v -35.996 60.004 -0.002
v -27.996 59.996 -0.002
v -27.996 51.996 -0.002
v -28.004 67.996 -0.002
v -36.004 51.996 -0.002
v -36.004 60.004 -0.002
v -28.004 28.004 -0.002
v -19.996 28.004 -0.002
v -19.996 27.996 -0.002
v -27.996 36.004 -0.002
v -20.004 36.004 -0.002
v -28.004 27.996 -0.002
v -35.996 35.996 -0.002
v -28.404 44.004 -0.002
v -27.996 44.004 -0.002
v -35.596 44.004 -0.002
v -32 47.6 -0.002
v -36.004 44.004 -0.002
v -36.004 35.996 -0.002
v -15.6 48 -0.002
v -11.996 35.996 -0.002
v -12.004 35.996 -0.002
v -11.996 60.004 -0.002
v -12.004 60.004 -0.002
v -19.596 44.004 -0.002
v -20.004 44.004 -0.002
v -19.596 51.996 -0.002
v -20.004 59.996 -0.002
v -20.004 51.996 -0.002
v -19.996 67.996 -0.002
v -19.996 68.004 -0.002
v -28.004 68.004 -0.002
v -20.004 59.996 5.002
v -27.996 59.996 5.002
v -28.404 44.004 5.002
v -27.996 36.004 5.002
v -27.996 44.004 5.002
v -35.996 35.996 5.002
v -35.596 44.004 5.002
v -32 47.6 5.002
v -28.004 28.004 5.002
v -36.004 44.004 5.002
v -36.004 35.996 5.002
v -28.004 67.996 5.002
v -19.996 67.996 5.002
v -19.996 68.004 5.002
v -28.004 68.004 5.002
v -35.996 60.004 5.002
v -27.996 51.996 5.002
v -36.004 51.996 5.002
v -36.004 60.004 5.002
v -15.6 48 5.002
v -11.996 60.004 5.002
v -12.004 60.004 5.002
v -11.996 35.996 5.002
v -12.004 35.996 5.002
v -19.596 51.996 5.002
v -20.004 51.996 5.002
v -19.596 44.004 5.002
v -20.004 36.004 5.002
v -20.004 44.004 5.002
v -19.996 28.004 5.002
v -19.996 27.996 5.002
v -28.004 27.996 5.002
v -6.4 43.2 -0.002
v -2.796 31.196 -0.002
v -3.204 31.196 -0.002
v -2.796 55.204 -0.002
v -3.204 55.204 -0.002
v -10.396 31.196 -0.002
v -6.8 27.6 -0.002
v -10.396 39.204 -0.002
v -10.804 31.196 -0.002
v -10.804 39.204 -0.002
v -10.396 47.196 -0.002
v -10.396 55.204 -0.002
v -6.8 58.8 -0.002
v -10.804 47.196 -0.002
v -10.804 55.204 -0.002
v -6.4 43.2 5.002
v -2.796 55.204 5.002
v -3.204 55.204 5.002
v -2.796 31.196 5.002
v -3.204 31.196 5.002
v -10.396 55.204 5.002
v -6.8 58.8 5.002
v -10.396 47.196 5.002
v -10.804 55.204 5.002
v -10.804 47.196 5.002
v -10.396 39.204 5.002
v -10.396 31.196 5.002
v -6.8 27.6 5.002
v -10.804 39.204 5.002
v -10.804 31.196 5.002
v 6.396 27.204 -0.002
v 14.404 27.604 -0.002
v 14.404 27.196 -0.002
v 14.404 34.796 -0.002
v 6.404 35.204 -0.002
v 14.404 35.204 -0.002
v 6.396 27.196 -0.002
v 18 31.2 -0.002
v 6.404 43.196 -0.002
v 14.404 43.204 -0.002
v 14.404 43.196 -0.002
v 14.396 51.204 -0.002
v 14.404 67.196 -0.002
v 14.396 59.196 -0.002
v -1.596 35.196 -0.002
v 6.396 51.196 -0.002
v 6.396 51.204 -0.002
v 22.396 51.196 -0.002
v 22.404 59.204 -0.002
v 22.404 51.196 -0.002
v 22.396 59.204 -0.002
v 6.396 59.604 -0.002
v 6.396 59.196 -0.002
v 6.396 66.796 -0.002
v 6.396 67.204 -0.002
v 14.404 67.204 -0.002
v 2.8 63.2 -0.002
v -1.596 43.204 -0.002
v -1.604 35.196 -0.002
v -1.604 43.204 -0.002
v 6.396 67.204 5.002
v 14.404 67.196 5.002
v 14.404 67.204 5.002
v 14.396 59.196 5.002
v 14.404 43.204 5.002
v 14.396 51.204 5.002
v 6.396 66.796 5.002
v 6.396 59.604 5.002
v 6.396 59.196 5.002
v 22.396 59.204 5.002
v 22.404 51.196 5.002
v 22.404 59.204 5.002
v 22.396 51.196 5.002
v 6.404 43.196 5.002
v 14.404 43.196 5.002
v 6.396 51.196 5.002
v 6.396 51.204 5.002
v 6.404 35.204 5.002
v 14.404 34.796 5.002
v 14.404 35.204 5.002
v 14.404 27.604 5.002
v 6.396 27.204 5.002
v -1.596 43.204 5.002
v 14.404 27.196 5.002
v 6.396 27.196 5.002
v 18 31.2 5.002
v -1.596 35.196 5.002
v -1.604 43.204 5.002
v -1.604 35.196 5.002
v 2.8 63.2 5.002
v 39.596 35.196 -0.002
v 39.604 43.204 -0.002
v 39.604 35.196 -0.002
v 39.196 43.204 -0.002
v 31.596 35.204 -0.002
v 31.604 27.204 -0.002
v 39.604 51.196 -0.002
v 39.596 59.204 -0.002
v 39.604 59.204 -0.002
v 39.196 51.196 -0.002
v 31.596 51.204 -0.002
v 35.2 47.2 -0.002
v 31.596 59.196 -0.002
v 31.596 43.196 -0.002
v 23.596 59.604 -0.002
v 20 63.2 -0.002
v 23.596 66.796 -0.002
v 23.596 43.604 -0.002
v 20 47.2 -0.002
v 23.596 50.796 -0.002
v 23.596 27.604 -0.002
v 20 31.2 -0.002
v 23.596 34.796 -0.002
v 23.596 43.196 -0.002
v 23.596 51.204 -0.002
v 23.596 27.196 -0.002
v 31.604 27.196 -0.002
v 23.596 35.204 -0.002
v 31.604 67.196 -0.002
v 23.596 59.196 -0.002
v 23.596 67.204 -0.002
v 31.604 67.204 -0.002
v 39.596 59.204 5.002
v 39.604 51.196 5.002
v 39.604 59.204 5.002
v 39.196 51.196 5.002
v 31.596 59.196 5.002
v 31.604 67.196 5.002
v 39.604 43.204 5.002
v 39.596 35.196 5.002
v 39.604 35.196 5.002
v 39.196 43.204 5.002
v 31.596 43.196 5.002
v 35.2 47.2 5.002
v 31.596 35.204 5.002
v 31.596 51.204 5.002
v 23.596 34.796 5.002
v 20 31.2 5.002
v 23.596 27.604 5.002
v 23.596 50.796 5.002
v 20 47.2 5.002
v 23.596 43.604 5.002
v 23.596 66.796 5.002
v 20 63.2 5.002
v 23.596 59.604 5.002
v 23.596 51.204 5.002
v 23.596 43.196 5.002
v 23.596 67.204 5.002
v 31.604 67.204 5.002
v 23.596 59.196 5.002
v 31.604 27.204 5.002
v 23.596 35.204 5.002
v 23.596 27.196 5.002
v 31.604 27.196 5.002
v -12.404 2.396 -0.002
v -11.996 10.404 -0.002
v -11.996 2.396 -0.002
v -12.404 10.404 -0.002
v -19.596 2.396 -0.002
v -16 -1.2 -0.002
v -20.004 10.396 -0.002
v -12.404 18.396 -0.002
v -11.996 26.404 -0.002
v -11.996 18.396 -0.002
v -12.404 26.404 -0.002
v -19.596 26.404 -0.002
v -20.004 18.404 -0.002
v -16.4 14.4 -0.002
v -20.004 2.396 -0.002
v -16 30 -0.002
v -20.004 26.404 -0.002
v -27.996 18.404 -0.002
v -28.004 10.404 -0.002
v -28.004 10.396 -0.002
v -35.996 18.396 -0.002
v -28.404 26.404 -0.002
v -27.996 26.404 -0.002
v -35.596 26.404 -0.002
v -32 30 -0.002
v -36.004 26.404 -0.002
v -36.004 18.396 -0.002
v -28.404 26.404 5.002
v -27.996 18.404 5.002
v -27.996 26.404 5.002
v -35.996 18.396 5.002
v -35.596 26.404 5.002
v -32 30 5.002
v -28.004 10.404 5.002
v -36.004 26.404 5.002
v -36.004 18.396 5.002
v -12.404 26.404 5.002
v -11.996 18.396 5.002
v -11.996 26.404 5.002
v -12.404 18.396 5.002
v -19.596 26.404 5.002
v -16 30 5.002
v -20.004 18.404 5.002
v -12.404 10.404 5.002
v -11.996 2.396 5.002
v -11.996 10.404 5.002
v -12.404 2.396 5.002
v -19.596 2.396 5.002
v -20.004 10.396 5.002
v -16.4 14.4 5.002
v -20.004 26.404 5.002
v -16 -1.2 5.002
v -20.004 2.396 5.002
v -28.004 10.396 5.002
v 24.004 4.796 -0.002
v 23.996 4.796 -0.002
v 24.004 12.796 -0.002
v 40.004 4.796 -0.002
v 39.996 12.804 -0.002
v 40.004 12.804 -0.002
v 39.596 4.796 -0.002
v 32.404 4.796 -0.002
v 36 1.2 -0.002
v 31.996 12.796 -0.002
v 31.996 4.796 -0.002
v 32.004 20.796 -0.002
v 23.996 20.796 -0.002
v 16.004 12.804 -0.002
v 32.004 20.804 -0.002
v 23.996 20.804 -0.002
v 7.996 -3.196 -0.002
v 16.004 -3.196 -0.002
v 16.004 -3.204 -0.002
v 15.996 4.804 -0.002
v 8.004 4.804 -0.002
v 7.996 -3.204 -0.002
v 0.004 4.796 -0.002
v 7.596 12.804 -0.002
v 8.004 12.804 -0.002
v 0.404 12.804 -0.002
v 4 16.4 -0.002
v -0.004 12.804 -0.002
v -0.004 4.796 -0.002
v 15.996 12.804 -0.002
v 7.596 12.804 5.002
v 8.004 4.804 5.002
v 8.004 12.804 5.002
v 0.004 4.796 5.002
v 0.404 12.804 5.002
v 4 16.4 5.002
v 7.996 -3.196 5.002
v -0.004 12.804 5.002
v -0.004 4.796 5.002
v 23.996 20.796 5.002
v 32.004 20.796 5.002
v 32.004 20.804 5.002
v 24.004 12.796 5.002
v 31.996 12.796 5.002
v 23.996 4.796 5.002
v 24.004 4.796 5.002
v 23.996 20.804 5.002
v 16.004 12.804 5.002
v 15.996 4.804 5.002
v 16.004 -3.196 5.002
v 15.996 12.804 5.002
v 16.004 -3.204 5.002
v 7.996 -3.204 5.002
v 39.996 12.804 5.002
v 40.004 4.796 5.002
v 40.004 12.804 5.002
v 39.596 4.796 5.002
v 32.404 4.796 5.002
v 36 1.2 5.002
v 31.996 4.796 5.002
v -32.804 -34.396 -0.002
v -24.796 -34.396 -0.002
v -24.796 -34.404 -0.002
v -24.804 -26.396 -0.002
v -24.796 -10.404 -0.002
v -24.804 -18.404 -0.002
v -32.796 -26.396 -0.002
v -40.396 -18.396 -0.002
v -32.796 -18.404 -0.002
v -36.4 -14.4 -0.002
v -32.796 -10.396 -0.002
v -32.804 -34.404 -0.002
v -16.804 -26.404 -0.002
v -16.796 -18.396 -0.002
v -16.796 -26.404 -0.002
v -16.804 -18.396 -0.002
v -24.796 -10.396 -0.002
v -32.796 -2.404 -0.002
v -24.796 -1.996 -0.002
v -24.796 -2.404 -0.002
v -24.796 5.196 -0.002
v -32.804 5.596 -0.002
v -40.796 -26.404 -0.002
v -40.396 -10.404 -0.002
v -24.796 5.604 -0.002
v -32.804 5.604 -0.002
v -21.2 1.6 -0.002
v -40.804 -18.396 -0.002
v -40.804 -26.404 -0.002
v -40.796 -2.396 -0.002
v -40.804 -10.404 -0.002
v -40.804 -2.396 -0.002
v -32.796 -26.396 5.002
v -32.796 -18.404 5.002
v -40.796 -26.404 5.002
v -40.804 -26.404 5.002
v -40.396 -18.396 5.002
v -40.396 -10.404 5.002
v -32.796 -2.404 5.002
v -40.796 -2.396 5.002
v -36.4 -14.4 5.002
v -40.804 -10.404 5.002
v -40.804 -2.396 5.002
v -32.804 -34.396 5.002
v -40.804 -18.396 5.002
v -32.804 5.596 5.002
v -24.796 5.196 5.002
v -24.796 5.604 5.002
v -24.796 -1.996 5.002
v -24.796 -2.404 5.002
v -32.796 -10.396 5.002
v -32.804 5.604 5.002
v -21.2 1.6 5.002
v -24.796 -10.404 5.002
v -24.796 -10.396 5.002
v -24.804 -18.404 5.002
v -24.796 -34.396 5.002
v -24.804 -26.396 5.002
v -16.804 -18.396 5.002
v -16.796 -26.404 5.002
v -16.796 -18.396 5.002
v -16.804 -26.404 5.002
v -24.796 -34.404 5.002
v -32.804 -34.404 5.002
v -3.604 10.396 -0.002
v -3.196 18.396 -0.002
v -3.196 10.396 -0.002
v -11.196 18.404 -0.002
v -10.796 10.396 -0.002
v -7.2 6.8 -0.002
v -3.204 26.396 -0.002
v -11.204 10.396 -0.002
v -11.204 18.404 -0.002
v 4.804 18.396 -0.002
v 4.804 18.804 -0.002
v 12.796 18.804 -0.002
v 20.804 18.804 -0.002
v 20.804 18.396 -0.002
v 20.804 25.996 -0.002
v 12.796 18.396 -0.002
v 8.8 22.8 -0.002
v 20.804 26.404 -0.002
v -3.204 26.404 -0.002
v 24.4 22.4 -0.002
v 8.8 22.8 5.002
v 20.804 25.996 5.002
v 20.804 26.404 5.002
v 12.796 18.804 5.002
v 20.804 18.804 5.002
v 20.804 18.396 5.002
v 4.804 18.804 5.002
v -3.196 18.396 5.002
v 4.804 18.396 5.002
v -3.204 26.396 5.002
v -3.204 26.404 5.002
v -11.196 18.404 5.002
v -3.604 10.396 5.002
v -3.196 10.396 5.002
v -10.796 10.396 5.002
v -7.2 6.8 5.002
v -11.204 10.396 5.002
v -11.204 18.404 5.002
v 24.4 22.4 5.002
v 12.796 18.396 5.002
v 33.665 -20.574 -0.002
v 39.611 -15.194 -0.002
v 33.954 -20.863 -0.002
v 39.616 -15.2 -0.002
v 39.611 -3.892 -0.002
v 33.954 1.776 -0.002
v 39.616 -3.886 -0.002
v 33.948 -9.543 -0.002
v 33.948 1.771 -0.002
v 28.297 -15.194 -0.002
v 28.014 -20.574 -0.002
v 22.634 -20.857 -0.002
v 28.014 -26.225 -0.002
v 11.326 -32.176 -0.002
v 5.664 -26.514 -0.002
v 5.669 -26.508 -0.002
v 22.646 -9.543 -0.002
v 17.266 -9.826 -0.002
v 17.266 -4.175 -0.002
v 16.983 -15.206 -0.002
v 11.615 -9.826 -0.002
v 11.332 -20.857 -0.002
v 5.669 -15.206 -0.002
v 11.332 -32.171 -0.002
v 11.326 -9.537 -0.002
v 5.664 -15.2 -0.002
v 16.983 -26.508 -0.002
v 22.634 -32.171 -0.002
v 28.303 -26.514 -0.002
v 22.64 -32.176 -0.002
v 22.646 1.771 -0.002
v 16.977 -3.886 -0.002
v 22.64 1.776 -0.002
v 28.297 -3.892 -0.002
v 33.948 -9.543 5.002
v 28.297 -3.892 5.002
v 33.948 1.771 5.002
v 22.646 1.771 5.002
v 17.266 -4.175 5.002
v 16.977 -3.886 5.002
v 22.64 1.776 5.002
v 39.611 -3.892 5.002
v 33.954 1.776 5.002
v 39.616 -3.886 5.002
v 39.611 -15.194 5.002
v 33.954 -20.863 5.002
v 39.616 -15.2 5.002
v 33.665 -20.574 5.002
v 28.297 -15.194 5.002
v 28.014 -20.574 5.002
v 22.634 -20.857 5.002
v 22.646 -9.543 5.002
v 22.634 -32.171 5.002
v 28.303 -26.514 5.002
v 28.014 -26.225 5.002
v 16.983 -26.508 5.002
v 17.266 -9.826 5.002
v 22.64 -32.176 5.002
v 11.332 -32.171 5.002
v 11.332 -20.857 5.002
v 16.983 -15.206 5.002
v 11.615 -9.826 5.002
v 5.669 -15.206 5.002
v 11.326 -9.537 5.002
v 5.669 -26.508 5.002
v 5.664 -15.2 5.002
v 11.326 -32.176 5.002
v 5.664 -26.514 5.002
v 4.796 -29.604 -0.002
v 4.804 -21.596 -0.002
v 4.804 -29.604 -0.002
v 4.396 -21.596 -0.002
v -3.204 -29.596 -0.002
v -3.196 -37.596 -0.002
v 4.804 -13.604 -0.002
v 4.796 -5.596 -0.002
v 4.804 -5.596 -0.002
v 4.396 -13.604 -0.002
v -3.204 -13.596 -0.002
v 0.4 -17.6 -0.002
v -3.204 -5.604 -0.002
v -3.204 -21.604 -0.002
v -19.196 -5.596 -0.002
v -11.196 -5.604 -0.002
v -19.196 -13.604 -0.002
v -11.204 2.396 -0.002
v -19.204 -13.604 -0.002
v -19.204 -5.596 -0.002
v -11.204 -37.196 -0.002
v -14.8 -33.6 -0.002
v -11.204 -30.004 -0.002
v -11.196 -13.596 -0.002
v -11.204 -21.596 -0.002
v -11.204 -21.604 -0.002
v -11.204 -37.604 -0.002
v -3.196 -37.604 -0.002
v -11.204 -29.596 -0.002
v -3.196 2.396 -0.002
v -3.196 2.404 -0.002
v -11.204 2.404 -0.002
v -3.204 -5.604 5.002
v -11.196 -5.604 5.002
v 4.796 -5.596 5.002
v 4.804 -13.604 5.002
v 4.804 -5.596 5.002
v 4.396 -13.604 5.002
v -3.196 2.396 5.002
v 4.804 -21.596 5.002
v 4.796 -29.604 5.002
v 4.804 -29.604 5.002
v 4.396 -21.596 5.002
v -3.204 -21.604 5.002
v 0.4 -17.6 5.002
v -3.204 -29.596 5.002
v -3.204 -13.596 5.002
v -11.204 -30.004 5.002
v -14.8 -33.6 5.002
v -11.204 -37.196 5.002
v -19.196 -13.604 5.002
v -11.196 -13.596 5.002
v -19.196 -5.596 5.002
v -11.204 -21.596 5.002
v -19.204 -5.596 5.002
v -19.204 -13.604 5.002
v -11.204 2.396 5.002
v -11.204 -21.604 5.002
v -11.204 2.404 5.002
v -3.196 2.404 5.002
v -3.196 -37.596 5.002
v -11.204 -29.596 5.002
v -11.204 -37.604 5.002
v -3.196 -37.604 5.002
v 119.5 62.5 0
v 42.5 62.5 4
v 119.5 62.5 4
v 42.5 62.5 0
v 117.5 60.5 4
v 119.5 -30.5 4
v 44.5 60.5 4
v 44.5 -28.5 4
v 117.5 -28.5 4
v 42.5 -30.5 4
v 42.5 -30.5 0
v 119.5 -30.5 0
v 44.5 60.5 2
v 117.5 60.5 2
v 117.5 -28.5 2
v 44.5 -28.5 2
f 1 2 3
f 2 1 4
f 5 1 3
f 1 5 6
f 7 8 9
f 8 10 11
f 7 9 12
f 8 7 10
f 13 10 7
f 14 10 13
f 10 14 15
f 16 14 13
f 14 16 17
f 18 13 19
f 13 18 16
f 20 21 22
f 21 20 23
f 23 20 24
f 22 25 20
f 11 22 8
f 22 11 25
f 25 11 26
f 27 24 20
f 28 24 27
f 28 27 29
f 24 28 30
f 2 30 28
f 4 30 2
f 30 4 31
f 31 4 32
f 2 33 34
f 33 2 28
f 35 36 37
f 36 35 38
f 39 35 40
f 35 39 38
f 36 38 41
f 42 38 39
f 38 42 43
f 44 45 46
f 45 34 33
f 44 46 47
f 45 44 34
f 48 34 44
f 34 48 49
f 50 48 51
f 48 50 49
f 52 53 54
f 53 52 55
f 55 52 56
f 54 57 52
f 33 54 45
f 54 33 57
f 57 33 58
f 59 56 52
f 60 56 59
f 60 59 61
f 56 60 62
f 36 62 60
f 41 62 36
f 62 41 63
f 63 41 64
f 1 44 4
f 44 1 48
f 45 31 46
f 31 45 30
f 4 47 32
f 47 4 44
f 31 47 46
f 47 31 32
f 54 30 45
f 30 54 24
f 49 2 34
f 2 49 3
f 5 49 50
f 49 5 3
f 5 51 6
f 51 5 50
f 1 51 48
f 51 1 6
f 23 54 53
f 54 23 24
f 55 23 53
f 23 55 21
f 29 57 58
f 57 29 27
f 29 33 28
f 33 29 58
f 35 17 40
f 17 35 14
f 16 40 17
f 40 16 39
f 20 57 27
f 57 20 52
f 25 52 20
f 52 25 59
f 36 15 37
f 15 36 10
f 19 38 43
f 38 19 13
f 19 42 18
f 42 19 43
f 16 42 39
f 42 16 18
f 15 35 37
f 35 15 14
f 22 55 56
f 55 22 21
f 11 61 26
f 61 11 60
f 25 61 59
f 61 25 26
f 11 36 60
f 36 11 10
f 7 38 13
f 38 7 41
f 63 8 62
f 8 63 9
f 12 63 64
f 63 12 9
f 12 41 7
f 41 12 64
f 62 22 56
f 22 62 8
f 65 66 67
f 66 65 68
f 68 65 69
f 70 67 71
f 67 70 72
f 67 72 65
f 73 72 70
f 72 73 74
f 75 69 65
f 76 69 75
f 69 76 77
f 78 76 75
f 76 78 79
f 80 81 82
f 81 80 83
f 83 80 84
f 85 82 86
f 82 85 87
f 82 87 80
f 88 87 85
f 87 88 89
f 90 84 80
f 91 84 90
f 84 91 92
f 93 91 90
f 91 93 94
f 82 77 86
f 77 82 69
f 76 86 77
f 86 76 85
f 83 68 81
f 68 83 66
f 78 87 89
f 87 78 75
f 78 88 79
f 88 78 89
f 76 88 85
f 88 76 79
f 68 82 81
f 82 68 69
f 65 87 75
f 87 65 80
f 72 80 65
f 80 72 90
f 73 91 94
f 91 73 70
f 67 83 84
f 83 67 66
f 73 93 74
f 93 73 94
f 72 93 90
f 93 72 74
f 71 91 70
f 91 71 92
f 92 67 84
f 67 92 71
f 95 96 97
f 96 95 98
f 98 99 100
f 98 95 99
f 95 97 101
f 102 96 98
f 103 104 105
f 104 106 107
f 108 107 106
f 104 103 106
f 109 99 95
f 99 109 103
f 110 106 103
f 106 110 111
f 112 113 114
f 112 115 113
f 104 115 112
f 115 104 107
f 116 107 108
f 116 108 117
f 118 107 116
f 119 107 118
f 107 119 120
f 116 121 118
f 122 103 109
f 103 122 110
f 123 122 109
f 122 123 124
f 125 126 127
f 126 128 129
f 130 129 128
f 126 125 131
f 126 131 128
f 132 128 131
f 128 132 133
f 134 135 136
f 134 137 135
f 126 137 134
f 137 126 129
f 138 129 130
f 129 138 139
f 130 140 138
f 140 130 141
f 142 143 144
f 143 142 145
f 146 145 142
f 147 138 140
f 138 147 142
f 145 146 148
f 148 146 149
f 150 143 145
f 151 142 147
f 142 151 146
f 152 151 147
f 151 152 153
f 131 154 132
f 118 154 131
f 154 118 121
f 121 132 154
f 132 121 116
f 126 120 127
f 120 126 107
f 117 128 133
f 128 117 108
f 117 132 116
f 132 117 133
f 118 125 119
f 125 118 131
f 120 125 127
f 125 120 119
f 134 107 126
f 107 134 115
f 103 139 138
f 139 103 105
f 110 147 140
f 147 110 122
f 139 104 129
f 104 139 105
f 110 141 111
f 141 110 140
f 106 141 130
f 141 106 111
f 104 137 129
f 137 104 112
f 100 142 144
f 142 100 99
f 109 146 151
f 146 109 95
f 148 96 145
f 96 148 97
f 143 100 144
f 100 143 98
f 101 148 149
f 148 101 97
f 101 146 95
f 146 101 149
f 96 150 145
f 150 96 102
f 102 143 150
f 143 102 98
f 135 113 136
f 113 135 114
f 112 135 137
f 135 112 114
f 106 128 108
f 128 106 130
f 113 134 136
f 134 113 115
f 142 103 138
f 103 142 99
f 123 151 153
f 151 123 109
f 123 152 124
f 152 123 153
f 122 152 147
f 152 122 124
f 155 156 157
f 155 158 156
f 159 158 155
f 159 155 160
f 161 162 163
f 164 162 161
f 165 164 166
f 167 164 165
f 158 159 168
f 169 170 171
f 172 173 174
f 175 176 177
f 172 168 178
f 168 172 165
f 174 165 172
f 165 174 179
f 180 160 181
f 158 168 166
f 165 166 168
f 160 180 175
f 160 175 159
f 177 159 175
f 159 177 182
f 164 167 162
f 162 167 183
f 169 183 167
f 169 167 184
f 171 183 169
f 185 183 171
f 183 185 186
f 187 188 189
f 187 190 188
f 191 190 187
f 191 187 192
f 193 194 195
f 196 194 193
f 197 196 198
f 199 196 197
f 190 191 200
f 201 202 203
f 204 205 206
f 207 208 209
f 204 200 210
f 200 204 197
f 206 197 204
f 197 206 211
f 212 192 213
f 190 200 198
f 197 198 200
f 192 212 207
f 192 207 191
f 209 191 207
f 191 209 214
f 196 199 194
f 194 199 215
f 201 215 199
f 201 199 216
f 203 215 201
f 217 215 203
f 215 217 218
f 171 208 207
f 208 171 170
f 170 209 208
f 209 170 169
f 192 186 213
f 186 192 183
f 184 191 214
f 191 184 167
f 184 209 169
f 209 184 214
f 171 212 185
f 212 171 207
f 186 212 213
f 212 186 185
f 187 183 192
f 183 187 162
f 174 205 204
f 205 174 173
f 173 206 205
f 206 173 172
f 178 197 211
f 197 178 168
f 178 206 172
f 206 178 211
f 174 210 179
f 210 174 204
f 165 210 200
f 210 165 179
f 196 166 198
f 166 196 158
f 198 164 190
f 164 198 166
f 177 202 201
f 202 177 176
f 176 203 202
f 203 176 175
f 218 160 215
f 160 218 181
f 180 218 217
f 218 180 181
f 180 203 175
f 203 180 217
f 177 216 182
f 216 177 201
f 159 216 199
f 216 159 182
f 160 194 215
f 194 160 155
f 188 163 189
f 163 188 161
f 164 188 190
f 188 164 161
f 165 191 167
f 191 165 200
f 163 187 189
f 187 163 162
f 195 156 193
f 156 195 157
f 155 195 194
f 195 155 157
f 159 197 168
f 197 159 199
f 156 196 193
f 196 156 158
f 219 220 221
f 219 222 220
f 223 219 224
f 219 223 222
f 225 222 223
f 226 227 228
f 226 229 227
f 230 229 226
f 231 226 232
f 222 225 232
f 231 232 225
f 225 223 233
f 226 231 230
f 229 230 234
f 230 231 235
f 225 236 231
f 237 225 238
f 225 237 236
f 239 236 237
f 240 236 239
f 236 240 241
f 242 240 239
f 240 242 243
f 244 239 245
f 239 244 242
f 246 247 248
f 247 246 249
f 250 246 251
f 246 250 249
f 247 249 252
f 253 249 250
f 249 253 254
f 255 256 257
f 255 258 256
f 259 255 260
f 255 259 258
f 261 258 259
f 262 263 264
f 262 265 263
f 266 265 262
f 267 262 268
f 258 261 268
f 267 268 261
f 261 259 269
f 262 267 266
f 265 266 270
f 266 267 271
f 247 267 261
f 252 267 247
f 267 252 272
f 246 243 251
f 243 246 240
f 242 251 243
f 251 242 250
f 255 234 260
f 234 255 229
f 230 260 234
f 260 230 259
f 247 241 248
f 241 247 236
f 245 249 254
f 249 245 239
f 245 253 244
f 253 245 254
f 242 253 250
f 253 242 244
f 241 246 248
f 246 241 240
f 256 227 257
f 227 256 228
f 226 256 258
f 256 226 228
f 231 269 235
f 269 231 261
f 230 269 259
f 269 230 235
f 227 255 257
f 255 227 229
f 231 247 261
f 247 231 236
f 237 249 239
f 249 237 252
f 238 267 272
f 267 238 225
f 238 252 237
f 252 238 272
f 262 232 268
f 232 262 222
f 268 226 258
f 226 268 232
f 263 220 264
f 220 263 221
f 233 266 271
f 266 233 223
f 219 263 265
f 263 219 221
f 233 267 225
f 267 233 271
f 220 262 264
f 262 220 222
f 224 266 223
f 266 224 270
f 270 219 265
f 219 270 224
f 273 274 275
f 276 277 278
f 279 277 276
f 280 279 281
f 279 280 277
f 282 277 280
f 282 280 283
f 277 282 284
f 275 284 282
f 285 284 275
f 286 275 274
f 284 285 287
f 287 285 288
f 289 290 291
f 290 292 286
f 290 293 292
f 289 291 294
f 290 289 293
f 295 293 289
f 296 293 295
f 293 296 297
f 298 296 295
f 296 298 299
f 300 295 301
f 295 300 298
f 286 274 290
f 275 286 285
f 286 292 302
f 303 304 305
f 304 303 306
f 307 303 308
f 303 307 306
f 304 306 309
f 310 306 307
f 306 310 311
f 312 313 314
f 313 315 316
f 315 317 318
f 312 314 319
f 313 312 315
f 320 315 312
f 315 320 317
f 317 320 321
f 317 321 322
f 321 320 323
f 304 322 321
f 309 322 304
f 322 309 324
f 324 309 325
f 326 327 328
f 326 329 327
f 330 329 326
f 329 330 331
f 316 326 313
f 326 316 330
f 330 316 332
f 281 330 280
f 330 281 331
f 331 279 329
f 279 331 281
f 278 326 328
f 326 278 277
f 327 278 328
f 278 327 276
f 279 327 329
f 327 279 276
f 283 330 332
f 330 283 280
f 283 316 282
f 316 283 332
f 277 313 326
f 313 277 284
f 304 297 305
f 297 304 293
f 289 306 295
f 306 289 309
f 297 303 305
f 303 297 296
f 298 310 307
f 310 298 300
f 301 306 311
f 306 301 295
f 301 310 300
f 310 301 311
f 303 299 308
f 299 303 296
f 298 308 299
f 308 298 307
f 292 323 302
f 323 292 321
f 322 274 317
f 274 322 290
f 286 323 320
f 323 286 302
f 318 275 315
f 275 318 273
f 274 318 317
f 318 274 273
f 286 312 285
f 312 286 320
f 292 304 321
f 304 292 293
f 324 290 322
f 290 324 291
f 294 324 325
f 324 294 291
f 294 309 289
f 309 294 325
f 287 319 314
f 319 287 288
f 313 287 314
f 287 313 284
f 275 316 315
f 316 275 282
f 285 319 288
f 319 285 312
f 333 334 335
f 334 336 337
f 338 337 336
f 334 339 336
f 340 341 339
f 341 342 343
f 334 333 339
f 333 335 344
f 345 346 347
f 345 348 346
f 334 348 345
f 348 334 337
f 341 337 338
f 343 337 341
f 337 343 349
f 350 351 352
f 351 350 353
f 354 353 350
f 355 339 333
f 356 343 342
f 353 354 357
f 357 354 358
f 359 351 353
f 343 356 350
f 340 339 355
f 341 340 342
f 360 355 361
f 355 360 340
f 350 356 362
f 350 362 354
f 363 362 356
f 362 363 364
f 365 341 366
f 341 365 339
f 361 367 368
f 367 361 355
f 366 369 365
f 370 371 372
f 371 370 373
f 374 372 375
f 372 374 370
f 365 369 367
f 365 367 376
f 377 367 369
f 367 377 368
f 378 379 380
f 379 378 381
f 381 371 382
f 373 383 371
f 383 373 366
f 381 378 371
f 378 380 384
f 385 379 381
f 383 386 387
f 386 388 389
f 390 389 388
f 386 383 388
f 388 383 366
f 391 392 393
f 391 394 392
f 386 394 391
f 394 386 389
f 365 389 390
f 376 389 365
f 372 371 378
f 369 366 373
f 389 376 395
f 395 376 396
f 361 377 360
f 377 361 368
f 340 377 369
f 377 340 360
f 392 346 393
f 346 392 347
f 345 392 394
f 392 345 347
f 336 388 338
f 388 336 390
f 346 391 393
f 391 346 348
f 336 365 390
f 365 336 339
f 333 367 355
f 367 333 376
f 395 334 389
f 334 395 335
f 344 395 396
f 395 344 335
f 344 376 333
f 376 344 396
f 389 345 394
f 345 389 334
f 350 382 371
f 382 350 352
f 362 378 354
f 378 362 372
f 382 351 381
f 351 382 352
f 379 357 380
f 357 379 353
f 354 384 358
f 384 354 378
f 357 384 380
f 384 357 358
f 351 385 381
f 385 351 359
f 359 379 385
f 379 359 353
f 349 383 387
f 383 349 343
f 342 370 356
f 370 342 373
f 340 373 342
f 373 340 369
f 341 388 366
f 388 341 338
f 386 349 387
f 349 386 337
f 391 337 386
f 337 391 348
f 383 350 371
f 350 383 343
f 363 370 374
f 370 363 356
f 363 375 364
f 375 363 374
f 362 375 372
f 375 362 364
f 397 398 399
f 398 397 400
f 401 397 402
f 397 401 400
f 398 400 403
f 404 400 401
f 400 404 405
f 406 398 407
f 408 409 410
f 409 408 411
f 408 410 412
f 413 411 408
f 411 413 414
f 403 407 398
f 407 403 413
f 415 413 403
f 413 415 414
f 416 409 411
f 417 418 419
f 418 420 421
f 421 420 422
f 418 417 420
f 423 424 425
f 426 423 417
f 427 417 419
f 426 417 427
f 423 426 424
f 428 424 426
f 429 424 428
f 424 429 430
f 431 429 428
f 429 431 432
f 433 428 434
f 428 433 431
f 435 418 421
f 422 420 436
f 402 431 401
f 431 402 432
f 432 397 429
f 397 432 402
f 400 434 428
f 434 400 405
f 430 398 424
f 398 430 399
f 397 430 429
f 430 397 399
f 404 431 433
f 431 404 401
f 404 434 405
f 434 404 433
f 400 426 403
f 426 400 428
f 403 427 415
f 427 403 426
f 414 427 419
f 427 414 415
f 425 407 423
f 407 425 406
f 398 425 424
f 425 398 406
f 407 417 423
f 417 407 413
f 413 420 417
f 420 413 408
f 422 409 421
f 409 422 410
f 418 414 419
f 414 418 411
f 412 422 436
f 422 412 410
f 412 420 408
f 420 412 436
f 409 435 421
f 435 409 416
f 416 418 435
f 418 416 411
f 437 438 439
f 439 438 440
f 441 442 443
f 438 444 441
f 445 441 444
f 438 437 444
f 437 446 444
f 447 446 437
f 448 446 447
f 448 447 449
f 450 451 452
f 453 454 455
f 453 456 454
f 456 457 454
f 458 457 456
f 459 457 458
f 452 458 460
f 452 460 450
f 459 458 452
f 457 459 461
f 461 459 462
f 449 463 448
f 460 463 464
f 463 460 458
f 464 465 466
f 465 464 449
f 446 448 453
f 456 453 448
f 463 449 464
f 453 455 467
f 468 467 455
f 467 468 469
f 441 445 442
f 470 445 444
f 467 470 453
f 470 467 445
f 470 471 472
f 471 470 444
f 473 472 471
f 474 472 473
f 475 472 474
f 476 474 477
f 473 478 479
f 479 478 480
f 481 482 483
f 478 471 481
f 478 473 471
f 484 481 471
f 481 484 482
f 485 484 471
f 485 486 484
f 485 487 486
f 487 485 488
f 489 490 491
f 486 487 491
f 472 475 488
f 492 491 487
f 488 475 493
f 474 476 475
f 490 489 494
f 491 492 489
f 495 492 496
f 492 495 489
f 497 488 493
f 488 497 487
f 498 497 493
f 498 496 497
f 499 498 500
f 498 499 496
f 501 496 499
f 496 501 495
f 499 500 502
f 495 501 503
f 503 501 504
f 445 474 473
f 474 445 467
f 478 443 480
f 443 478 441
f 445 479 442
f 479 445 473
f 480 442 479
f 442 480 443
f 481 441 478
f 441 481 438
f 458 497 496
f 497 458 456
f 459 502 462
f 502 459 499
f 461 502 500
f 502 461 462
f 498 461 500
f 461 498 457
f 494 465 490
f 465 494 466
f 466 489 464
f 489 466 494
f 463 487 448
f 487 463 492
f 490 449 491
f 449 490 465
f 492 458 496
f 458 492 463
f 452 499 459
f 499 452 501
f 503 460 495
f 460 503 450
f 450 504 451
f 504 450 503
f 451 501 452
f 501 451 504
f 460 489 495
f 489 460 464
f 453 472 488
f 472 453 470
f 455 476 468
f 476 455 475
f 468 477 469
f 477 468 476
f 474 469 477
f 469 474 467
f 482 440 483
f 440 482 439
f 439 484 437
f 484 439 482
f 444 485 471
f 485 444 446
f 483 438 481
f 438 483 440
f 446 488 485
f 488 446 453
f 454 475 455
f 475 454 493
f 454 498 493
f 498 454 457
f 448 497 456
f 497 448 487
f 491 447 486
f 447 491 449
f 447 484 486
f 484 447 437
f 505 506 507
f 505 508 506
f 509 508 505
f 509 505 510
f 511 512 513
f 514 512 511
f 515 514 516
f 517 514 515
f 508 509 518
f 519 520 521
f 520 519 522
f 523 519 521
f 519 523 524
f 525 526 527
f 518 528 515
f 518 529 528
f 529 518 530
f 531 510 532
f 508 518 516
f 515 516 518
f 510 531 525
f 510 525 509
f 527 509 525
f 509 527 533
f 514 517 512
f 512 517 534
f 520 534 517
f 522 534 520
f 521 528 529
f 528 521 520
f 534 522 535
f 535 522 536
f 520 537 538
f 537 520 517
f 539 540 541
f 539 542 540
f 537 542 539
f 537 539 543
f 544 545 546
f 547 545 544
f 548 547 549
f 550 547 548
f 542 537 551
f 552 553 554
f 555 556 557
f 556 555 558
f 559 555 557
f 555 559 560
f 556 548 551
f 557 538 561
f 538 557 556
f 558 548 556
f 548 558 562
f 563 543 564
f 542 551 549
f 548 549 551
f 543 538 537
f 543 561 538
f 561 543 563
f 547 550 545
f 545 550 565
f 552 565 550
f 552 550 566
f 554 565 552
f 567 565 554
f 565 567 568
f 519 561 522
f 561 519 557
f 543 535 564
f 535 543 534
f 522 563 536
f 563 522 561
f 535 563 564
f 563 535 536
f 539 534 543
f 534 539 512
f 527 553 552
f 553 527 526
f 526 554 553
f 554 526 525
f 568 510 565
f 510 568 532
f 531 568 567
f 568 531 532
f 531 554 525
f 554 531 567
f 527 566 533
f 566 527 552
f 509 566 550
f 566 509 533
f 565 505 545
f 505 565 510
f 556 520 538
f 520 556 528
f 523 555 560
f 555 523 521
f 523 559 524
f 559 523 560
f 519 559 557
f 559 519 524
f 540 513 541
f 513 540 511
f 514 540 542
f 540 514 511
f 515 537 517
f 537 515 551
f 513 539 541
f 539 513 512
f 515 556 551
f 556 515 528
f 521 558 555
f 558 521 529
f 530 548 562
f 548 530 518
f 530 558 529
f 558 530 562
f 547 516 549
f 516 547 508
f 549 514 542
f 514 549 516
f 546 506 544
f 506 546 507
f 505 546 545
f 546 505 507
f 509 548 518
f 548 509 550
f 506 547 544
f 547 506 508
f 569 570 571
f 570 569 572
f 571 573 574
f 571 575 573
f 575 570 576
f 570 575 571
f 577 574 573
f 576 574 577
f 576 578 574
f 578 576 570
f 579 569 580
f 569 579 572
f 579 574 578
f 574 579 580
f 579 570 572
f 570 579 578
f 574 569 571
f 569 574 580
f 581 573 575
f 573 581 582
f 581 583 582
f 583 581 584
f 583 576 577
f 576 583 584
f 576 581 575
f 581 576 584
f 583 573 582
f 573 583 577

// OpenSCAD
//digits are made of 3x5 'boxels'. specify boxel size (mm)
boxel_size=8;
//elements height (mm)
elem_height=5;
//Display solved puzzle
solved=0;
//render box
box=1;
//box_thickness (mm)
box_thickness=2;
//extra space in box to ease insertion (mm)
space=1;
//ease in the dented boxels. keep this very small (~0.05)
jeu=0.05;
//box height (mm)
box_height=2;
//render colors (0 fot no / 1 for yes)
colored=0;
boxel=[
	[],							//empty
	[[-0.5,-0.5],[0.5,-0.5],[0.5,0.5],[-0.5,0.5]],		//full
	[[-0.5,-0.5],[0.5,-0.5],[0.5,0.5]],			//half (diagonal)
	[[-0.5+jeu,-0.5],[0.5-jeu,-0.5],[0,-jeu]],				//pointy dent
	[[-0.5,-0.5+jeu],[-0.5,0.5],[0.5,0.5],[0.5,-0.5+jeu],[0,jeu]]	//full dented
];

//digits definitions. 5 x 3 pairs, each pair is [boxel index , Z rotate x 90°]
digit=[
[  //0
 [[2,0],[1,0],[2,3]],
 [[1,0],[0,0],[1,1]],
 [[3,0],[0,0],[4,3]],
 [[1,0],[0,0],[1,0]],
 [[2,1],[1,0],[2,2]]
],
[ //1
[[3,0],[0,0],[0,0]],
[[1,0],[0,0],[0,0]],
[[4,3],[0,0],[0,0]],
[[1,0],[0,0],[0,0]],
[[3,2],[0,0],[0,0]]
],
[ //2
 [[3,1],[1,0],[2,3]],
 [[0,0],[0,0],[1,0]],
 [[2,0],[1,0],[2,2]],
 [[1,0],[0,0],[0,0]],
 [[2,1],[1,0],[3,3]]
],
[ //3
 [[3,1],[1,0],[2,3]],
 [[0,0],[0,0],[1,0]],
 [[3,1],[1,0],[4,1]],
 [[0,0],[0,0],[1,0]],
 [[3,1],[1,0],[2,2]]
],
[ //4
 [[3,0],[0,0],[3,0]],
 [[1,0],[0,0],[1,0]],
 [[2,1],[1,0],[4,1]],
 [[0,0],[0,0],[1,0]],
 [[0,0],[0,0],[3,2]]
],
[ //5
 [[2,0],[1,0],[3,3]],
 [[1,0],[0,0],[0,0]],
 [[2,1],[1,0],[2,3]],
 [[0,0],[0,0],[1,0]],
 [[3,1],[1,0],[2,2]]
],
[ //6
 [[2,0],[1,0],[3,3]],
 [[1,0],[0,0],[0,0]],
 [[4,3],[1,0],[2,3]],
 [[1,0],[0,0],[1,0]],
 [[2,1],[1,0],[2,2]]
],
[ //7
 [[3,1],[1,0],[2,3]],
 [[0,0],[0,0],[1,1]],
 [[0,0],[0,0],[4,3]],
 [[0,0],[0,0],[1,0]],
 [[0,0],[0,0],[3,2]]
],
[ //8
 [[2,0],[1,0],[2,3]],
 [[1,0],[0,0],[1,0]],
 [[4,3],[1,0],[4,1]],
 [[1,0],[0,0],[1,0]],
 [[2,1],[1,0],[2,2]]
],
[ //9
 [[2,0],[1,0],[2,3]],
 [[1,0],[0,0],[1,0]],
 [[2,1],[1,0],[4,1]],
 [[0,0],[0,0],[1,0]],
 [[3,1],[1,0],[2,2]]
]
];



//Rotate to solve
rsolved=[
	[  0	,  0	,  0	],	//  0
	[  0	,  0	,-90	], 	//  1
	[  0	,180	,-90	],	//  2
	[  0	,  0	, 90	],	//  3
	[  0	,  0	, 90	],	//  4
	[  0	,  0	,  0	],	//  5
	[  0	,  0	,-90	],	//  6
	[  0	,  0	, 90	],	//  7
	[  0	,  0	,  0	],	//  8
	[  0	,  0	,-90	]	//  9
	];

//Translate to solve
tsolved=[
	[ 7	, 1	, 0	],	//  0
	[ 4	,-2	, 0	], 	//  1
	[ 0	, 2	, 0	],	//  2
	[ 6	, 6	, 0	],	//  3
	[ 2	, 6	, 0	],	//  4
	[ 3	, 3	, 0	],	//  5
	[ 6	, 4	, 0	],	//  6
	[ 6	, 0	, 0	],	//  7
	[-1	, 5	, 0	],	//  8
	[ 0	, 0	, 0	]	//  9
	];

//Rotate to print
rprint=[
	[  0	,0	,  0	],	//  0
	[  0	,0	,  0	],	//  1
	[  0	,0	,  0	],	//  2
	[  0	,0	,  0	],	//  3
	[  0	,0	,  0	],	//  4
	[  0	,0	, 90	],	//  5
	[  0	,0	,  0	],	//  6
	[  0	,0	, 90	],	//  7
	[  0	,0	,-45	],	//  8
	[  0	,0	,  0	],	//  9
	];

//Translate to print 
// (a bit messy, but minimizes footprint & travel time without showing the solution)
tprint=[
	[-3	, 6.0	,0	],	//  0
	[ 0.15	, 5.4	,0	],	//  1
	[ 1.3	, 5.9	,0	],  	//  2
	[ 3.45	, 5.9	,0	],  	//  3
	[-3	, 1.8	,0	],  	//  4
	[ 2.5	, 1.1	,0	],	//  5
	[-3.6	,-1.8	,0	],  	//  6
	[ 1.1	, 1.8	,0	],  	//  7
	[ 2.83	,-1.9	,0	],	//  8
	[-0.9	,-2.2	,0	]   	//  9
	];
	
dcolor=[[0.5,0.5,0],[0.5,0,0.5],[0,0.5,0.5],[1,0,0],[0,1,0],[0,0,1],[1,1,0],[0,1,1],[1,0,1],[0.5,1,0.8],];

//--------------------------------------------------------------
// render digit n° nd
//--------------------------------------------------------------
module mkdigit(nd) {
	for ( row = [0 : 4] )
		{
		for ( col = [0 : 2] )
			{
			translate([(col-1)*boxel_size,(2-row)*boxel_size,0])
			scale([boxel_size,boxel_size,1])
			rotate([0,0,digit[nd][row][col][1]*90])
					scale(1.001) //for manifold... avoids adjacent faces
					linear_extrude(height = elem_height, center = true, convexity = 10)
					polygon(points=boxel[digit[nd][row][col][0]]);
			}
		}
     
 };

//--------------------------------------------------------------
// render and place all digits
//--------------------------------------------------------------
 for (digitnum=[0:9])
 {
	color(colored*dcolor[digitnum]+(1-colored)*[0.5,0.8,1]) 
	union() {
	translate([0,0,elem_height/2]+(box*solved*[0,0,box_thickness]))
	translate((1-solved)*tprint[digitnum]*boxel_size) 
	translate(solved*boxel_size*(tsolved[digitnum]-[3,3,0]))
		rotate(solved*rsolved[digitnum])
		rotate((1-solved)*rprint[digitnum])
			mkdigit(digitnum);
	}
} 

//--------------------------------------------------------------
// render box
//--------------------------------------------------------------
scale(box)
translate((1-solved)*[boxel_size*9.5+box_thickness*2+space,boxel_size*2,0])
translate([0,0,(box_height+box_thickness)/2])
rotate((1-solved)*[0,0,90])
difference(){
	cube(size=[boxel_size*11+box_thickness*2+space,boxel_size*9+box_thickness*2+space,box_height+box_thickness],center=true);
	translate([0,0,box_thickness])cube(size=[boxel_size*11+space,boxel_size*9+space,box_height+box_thickness],center=true);
}
